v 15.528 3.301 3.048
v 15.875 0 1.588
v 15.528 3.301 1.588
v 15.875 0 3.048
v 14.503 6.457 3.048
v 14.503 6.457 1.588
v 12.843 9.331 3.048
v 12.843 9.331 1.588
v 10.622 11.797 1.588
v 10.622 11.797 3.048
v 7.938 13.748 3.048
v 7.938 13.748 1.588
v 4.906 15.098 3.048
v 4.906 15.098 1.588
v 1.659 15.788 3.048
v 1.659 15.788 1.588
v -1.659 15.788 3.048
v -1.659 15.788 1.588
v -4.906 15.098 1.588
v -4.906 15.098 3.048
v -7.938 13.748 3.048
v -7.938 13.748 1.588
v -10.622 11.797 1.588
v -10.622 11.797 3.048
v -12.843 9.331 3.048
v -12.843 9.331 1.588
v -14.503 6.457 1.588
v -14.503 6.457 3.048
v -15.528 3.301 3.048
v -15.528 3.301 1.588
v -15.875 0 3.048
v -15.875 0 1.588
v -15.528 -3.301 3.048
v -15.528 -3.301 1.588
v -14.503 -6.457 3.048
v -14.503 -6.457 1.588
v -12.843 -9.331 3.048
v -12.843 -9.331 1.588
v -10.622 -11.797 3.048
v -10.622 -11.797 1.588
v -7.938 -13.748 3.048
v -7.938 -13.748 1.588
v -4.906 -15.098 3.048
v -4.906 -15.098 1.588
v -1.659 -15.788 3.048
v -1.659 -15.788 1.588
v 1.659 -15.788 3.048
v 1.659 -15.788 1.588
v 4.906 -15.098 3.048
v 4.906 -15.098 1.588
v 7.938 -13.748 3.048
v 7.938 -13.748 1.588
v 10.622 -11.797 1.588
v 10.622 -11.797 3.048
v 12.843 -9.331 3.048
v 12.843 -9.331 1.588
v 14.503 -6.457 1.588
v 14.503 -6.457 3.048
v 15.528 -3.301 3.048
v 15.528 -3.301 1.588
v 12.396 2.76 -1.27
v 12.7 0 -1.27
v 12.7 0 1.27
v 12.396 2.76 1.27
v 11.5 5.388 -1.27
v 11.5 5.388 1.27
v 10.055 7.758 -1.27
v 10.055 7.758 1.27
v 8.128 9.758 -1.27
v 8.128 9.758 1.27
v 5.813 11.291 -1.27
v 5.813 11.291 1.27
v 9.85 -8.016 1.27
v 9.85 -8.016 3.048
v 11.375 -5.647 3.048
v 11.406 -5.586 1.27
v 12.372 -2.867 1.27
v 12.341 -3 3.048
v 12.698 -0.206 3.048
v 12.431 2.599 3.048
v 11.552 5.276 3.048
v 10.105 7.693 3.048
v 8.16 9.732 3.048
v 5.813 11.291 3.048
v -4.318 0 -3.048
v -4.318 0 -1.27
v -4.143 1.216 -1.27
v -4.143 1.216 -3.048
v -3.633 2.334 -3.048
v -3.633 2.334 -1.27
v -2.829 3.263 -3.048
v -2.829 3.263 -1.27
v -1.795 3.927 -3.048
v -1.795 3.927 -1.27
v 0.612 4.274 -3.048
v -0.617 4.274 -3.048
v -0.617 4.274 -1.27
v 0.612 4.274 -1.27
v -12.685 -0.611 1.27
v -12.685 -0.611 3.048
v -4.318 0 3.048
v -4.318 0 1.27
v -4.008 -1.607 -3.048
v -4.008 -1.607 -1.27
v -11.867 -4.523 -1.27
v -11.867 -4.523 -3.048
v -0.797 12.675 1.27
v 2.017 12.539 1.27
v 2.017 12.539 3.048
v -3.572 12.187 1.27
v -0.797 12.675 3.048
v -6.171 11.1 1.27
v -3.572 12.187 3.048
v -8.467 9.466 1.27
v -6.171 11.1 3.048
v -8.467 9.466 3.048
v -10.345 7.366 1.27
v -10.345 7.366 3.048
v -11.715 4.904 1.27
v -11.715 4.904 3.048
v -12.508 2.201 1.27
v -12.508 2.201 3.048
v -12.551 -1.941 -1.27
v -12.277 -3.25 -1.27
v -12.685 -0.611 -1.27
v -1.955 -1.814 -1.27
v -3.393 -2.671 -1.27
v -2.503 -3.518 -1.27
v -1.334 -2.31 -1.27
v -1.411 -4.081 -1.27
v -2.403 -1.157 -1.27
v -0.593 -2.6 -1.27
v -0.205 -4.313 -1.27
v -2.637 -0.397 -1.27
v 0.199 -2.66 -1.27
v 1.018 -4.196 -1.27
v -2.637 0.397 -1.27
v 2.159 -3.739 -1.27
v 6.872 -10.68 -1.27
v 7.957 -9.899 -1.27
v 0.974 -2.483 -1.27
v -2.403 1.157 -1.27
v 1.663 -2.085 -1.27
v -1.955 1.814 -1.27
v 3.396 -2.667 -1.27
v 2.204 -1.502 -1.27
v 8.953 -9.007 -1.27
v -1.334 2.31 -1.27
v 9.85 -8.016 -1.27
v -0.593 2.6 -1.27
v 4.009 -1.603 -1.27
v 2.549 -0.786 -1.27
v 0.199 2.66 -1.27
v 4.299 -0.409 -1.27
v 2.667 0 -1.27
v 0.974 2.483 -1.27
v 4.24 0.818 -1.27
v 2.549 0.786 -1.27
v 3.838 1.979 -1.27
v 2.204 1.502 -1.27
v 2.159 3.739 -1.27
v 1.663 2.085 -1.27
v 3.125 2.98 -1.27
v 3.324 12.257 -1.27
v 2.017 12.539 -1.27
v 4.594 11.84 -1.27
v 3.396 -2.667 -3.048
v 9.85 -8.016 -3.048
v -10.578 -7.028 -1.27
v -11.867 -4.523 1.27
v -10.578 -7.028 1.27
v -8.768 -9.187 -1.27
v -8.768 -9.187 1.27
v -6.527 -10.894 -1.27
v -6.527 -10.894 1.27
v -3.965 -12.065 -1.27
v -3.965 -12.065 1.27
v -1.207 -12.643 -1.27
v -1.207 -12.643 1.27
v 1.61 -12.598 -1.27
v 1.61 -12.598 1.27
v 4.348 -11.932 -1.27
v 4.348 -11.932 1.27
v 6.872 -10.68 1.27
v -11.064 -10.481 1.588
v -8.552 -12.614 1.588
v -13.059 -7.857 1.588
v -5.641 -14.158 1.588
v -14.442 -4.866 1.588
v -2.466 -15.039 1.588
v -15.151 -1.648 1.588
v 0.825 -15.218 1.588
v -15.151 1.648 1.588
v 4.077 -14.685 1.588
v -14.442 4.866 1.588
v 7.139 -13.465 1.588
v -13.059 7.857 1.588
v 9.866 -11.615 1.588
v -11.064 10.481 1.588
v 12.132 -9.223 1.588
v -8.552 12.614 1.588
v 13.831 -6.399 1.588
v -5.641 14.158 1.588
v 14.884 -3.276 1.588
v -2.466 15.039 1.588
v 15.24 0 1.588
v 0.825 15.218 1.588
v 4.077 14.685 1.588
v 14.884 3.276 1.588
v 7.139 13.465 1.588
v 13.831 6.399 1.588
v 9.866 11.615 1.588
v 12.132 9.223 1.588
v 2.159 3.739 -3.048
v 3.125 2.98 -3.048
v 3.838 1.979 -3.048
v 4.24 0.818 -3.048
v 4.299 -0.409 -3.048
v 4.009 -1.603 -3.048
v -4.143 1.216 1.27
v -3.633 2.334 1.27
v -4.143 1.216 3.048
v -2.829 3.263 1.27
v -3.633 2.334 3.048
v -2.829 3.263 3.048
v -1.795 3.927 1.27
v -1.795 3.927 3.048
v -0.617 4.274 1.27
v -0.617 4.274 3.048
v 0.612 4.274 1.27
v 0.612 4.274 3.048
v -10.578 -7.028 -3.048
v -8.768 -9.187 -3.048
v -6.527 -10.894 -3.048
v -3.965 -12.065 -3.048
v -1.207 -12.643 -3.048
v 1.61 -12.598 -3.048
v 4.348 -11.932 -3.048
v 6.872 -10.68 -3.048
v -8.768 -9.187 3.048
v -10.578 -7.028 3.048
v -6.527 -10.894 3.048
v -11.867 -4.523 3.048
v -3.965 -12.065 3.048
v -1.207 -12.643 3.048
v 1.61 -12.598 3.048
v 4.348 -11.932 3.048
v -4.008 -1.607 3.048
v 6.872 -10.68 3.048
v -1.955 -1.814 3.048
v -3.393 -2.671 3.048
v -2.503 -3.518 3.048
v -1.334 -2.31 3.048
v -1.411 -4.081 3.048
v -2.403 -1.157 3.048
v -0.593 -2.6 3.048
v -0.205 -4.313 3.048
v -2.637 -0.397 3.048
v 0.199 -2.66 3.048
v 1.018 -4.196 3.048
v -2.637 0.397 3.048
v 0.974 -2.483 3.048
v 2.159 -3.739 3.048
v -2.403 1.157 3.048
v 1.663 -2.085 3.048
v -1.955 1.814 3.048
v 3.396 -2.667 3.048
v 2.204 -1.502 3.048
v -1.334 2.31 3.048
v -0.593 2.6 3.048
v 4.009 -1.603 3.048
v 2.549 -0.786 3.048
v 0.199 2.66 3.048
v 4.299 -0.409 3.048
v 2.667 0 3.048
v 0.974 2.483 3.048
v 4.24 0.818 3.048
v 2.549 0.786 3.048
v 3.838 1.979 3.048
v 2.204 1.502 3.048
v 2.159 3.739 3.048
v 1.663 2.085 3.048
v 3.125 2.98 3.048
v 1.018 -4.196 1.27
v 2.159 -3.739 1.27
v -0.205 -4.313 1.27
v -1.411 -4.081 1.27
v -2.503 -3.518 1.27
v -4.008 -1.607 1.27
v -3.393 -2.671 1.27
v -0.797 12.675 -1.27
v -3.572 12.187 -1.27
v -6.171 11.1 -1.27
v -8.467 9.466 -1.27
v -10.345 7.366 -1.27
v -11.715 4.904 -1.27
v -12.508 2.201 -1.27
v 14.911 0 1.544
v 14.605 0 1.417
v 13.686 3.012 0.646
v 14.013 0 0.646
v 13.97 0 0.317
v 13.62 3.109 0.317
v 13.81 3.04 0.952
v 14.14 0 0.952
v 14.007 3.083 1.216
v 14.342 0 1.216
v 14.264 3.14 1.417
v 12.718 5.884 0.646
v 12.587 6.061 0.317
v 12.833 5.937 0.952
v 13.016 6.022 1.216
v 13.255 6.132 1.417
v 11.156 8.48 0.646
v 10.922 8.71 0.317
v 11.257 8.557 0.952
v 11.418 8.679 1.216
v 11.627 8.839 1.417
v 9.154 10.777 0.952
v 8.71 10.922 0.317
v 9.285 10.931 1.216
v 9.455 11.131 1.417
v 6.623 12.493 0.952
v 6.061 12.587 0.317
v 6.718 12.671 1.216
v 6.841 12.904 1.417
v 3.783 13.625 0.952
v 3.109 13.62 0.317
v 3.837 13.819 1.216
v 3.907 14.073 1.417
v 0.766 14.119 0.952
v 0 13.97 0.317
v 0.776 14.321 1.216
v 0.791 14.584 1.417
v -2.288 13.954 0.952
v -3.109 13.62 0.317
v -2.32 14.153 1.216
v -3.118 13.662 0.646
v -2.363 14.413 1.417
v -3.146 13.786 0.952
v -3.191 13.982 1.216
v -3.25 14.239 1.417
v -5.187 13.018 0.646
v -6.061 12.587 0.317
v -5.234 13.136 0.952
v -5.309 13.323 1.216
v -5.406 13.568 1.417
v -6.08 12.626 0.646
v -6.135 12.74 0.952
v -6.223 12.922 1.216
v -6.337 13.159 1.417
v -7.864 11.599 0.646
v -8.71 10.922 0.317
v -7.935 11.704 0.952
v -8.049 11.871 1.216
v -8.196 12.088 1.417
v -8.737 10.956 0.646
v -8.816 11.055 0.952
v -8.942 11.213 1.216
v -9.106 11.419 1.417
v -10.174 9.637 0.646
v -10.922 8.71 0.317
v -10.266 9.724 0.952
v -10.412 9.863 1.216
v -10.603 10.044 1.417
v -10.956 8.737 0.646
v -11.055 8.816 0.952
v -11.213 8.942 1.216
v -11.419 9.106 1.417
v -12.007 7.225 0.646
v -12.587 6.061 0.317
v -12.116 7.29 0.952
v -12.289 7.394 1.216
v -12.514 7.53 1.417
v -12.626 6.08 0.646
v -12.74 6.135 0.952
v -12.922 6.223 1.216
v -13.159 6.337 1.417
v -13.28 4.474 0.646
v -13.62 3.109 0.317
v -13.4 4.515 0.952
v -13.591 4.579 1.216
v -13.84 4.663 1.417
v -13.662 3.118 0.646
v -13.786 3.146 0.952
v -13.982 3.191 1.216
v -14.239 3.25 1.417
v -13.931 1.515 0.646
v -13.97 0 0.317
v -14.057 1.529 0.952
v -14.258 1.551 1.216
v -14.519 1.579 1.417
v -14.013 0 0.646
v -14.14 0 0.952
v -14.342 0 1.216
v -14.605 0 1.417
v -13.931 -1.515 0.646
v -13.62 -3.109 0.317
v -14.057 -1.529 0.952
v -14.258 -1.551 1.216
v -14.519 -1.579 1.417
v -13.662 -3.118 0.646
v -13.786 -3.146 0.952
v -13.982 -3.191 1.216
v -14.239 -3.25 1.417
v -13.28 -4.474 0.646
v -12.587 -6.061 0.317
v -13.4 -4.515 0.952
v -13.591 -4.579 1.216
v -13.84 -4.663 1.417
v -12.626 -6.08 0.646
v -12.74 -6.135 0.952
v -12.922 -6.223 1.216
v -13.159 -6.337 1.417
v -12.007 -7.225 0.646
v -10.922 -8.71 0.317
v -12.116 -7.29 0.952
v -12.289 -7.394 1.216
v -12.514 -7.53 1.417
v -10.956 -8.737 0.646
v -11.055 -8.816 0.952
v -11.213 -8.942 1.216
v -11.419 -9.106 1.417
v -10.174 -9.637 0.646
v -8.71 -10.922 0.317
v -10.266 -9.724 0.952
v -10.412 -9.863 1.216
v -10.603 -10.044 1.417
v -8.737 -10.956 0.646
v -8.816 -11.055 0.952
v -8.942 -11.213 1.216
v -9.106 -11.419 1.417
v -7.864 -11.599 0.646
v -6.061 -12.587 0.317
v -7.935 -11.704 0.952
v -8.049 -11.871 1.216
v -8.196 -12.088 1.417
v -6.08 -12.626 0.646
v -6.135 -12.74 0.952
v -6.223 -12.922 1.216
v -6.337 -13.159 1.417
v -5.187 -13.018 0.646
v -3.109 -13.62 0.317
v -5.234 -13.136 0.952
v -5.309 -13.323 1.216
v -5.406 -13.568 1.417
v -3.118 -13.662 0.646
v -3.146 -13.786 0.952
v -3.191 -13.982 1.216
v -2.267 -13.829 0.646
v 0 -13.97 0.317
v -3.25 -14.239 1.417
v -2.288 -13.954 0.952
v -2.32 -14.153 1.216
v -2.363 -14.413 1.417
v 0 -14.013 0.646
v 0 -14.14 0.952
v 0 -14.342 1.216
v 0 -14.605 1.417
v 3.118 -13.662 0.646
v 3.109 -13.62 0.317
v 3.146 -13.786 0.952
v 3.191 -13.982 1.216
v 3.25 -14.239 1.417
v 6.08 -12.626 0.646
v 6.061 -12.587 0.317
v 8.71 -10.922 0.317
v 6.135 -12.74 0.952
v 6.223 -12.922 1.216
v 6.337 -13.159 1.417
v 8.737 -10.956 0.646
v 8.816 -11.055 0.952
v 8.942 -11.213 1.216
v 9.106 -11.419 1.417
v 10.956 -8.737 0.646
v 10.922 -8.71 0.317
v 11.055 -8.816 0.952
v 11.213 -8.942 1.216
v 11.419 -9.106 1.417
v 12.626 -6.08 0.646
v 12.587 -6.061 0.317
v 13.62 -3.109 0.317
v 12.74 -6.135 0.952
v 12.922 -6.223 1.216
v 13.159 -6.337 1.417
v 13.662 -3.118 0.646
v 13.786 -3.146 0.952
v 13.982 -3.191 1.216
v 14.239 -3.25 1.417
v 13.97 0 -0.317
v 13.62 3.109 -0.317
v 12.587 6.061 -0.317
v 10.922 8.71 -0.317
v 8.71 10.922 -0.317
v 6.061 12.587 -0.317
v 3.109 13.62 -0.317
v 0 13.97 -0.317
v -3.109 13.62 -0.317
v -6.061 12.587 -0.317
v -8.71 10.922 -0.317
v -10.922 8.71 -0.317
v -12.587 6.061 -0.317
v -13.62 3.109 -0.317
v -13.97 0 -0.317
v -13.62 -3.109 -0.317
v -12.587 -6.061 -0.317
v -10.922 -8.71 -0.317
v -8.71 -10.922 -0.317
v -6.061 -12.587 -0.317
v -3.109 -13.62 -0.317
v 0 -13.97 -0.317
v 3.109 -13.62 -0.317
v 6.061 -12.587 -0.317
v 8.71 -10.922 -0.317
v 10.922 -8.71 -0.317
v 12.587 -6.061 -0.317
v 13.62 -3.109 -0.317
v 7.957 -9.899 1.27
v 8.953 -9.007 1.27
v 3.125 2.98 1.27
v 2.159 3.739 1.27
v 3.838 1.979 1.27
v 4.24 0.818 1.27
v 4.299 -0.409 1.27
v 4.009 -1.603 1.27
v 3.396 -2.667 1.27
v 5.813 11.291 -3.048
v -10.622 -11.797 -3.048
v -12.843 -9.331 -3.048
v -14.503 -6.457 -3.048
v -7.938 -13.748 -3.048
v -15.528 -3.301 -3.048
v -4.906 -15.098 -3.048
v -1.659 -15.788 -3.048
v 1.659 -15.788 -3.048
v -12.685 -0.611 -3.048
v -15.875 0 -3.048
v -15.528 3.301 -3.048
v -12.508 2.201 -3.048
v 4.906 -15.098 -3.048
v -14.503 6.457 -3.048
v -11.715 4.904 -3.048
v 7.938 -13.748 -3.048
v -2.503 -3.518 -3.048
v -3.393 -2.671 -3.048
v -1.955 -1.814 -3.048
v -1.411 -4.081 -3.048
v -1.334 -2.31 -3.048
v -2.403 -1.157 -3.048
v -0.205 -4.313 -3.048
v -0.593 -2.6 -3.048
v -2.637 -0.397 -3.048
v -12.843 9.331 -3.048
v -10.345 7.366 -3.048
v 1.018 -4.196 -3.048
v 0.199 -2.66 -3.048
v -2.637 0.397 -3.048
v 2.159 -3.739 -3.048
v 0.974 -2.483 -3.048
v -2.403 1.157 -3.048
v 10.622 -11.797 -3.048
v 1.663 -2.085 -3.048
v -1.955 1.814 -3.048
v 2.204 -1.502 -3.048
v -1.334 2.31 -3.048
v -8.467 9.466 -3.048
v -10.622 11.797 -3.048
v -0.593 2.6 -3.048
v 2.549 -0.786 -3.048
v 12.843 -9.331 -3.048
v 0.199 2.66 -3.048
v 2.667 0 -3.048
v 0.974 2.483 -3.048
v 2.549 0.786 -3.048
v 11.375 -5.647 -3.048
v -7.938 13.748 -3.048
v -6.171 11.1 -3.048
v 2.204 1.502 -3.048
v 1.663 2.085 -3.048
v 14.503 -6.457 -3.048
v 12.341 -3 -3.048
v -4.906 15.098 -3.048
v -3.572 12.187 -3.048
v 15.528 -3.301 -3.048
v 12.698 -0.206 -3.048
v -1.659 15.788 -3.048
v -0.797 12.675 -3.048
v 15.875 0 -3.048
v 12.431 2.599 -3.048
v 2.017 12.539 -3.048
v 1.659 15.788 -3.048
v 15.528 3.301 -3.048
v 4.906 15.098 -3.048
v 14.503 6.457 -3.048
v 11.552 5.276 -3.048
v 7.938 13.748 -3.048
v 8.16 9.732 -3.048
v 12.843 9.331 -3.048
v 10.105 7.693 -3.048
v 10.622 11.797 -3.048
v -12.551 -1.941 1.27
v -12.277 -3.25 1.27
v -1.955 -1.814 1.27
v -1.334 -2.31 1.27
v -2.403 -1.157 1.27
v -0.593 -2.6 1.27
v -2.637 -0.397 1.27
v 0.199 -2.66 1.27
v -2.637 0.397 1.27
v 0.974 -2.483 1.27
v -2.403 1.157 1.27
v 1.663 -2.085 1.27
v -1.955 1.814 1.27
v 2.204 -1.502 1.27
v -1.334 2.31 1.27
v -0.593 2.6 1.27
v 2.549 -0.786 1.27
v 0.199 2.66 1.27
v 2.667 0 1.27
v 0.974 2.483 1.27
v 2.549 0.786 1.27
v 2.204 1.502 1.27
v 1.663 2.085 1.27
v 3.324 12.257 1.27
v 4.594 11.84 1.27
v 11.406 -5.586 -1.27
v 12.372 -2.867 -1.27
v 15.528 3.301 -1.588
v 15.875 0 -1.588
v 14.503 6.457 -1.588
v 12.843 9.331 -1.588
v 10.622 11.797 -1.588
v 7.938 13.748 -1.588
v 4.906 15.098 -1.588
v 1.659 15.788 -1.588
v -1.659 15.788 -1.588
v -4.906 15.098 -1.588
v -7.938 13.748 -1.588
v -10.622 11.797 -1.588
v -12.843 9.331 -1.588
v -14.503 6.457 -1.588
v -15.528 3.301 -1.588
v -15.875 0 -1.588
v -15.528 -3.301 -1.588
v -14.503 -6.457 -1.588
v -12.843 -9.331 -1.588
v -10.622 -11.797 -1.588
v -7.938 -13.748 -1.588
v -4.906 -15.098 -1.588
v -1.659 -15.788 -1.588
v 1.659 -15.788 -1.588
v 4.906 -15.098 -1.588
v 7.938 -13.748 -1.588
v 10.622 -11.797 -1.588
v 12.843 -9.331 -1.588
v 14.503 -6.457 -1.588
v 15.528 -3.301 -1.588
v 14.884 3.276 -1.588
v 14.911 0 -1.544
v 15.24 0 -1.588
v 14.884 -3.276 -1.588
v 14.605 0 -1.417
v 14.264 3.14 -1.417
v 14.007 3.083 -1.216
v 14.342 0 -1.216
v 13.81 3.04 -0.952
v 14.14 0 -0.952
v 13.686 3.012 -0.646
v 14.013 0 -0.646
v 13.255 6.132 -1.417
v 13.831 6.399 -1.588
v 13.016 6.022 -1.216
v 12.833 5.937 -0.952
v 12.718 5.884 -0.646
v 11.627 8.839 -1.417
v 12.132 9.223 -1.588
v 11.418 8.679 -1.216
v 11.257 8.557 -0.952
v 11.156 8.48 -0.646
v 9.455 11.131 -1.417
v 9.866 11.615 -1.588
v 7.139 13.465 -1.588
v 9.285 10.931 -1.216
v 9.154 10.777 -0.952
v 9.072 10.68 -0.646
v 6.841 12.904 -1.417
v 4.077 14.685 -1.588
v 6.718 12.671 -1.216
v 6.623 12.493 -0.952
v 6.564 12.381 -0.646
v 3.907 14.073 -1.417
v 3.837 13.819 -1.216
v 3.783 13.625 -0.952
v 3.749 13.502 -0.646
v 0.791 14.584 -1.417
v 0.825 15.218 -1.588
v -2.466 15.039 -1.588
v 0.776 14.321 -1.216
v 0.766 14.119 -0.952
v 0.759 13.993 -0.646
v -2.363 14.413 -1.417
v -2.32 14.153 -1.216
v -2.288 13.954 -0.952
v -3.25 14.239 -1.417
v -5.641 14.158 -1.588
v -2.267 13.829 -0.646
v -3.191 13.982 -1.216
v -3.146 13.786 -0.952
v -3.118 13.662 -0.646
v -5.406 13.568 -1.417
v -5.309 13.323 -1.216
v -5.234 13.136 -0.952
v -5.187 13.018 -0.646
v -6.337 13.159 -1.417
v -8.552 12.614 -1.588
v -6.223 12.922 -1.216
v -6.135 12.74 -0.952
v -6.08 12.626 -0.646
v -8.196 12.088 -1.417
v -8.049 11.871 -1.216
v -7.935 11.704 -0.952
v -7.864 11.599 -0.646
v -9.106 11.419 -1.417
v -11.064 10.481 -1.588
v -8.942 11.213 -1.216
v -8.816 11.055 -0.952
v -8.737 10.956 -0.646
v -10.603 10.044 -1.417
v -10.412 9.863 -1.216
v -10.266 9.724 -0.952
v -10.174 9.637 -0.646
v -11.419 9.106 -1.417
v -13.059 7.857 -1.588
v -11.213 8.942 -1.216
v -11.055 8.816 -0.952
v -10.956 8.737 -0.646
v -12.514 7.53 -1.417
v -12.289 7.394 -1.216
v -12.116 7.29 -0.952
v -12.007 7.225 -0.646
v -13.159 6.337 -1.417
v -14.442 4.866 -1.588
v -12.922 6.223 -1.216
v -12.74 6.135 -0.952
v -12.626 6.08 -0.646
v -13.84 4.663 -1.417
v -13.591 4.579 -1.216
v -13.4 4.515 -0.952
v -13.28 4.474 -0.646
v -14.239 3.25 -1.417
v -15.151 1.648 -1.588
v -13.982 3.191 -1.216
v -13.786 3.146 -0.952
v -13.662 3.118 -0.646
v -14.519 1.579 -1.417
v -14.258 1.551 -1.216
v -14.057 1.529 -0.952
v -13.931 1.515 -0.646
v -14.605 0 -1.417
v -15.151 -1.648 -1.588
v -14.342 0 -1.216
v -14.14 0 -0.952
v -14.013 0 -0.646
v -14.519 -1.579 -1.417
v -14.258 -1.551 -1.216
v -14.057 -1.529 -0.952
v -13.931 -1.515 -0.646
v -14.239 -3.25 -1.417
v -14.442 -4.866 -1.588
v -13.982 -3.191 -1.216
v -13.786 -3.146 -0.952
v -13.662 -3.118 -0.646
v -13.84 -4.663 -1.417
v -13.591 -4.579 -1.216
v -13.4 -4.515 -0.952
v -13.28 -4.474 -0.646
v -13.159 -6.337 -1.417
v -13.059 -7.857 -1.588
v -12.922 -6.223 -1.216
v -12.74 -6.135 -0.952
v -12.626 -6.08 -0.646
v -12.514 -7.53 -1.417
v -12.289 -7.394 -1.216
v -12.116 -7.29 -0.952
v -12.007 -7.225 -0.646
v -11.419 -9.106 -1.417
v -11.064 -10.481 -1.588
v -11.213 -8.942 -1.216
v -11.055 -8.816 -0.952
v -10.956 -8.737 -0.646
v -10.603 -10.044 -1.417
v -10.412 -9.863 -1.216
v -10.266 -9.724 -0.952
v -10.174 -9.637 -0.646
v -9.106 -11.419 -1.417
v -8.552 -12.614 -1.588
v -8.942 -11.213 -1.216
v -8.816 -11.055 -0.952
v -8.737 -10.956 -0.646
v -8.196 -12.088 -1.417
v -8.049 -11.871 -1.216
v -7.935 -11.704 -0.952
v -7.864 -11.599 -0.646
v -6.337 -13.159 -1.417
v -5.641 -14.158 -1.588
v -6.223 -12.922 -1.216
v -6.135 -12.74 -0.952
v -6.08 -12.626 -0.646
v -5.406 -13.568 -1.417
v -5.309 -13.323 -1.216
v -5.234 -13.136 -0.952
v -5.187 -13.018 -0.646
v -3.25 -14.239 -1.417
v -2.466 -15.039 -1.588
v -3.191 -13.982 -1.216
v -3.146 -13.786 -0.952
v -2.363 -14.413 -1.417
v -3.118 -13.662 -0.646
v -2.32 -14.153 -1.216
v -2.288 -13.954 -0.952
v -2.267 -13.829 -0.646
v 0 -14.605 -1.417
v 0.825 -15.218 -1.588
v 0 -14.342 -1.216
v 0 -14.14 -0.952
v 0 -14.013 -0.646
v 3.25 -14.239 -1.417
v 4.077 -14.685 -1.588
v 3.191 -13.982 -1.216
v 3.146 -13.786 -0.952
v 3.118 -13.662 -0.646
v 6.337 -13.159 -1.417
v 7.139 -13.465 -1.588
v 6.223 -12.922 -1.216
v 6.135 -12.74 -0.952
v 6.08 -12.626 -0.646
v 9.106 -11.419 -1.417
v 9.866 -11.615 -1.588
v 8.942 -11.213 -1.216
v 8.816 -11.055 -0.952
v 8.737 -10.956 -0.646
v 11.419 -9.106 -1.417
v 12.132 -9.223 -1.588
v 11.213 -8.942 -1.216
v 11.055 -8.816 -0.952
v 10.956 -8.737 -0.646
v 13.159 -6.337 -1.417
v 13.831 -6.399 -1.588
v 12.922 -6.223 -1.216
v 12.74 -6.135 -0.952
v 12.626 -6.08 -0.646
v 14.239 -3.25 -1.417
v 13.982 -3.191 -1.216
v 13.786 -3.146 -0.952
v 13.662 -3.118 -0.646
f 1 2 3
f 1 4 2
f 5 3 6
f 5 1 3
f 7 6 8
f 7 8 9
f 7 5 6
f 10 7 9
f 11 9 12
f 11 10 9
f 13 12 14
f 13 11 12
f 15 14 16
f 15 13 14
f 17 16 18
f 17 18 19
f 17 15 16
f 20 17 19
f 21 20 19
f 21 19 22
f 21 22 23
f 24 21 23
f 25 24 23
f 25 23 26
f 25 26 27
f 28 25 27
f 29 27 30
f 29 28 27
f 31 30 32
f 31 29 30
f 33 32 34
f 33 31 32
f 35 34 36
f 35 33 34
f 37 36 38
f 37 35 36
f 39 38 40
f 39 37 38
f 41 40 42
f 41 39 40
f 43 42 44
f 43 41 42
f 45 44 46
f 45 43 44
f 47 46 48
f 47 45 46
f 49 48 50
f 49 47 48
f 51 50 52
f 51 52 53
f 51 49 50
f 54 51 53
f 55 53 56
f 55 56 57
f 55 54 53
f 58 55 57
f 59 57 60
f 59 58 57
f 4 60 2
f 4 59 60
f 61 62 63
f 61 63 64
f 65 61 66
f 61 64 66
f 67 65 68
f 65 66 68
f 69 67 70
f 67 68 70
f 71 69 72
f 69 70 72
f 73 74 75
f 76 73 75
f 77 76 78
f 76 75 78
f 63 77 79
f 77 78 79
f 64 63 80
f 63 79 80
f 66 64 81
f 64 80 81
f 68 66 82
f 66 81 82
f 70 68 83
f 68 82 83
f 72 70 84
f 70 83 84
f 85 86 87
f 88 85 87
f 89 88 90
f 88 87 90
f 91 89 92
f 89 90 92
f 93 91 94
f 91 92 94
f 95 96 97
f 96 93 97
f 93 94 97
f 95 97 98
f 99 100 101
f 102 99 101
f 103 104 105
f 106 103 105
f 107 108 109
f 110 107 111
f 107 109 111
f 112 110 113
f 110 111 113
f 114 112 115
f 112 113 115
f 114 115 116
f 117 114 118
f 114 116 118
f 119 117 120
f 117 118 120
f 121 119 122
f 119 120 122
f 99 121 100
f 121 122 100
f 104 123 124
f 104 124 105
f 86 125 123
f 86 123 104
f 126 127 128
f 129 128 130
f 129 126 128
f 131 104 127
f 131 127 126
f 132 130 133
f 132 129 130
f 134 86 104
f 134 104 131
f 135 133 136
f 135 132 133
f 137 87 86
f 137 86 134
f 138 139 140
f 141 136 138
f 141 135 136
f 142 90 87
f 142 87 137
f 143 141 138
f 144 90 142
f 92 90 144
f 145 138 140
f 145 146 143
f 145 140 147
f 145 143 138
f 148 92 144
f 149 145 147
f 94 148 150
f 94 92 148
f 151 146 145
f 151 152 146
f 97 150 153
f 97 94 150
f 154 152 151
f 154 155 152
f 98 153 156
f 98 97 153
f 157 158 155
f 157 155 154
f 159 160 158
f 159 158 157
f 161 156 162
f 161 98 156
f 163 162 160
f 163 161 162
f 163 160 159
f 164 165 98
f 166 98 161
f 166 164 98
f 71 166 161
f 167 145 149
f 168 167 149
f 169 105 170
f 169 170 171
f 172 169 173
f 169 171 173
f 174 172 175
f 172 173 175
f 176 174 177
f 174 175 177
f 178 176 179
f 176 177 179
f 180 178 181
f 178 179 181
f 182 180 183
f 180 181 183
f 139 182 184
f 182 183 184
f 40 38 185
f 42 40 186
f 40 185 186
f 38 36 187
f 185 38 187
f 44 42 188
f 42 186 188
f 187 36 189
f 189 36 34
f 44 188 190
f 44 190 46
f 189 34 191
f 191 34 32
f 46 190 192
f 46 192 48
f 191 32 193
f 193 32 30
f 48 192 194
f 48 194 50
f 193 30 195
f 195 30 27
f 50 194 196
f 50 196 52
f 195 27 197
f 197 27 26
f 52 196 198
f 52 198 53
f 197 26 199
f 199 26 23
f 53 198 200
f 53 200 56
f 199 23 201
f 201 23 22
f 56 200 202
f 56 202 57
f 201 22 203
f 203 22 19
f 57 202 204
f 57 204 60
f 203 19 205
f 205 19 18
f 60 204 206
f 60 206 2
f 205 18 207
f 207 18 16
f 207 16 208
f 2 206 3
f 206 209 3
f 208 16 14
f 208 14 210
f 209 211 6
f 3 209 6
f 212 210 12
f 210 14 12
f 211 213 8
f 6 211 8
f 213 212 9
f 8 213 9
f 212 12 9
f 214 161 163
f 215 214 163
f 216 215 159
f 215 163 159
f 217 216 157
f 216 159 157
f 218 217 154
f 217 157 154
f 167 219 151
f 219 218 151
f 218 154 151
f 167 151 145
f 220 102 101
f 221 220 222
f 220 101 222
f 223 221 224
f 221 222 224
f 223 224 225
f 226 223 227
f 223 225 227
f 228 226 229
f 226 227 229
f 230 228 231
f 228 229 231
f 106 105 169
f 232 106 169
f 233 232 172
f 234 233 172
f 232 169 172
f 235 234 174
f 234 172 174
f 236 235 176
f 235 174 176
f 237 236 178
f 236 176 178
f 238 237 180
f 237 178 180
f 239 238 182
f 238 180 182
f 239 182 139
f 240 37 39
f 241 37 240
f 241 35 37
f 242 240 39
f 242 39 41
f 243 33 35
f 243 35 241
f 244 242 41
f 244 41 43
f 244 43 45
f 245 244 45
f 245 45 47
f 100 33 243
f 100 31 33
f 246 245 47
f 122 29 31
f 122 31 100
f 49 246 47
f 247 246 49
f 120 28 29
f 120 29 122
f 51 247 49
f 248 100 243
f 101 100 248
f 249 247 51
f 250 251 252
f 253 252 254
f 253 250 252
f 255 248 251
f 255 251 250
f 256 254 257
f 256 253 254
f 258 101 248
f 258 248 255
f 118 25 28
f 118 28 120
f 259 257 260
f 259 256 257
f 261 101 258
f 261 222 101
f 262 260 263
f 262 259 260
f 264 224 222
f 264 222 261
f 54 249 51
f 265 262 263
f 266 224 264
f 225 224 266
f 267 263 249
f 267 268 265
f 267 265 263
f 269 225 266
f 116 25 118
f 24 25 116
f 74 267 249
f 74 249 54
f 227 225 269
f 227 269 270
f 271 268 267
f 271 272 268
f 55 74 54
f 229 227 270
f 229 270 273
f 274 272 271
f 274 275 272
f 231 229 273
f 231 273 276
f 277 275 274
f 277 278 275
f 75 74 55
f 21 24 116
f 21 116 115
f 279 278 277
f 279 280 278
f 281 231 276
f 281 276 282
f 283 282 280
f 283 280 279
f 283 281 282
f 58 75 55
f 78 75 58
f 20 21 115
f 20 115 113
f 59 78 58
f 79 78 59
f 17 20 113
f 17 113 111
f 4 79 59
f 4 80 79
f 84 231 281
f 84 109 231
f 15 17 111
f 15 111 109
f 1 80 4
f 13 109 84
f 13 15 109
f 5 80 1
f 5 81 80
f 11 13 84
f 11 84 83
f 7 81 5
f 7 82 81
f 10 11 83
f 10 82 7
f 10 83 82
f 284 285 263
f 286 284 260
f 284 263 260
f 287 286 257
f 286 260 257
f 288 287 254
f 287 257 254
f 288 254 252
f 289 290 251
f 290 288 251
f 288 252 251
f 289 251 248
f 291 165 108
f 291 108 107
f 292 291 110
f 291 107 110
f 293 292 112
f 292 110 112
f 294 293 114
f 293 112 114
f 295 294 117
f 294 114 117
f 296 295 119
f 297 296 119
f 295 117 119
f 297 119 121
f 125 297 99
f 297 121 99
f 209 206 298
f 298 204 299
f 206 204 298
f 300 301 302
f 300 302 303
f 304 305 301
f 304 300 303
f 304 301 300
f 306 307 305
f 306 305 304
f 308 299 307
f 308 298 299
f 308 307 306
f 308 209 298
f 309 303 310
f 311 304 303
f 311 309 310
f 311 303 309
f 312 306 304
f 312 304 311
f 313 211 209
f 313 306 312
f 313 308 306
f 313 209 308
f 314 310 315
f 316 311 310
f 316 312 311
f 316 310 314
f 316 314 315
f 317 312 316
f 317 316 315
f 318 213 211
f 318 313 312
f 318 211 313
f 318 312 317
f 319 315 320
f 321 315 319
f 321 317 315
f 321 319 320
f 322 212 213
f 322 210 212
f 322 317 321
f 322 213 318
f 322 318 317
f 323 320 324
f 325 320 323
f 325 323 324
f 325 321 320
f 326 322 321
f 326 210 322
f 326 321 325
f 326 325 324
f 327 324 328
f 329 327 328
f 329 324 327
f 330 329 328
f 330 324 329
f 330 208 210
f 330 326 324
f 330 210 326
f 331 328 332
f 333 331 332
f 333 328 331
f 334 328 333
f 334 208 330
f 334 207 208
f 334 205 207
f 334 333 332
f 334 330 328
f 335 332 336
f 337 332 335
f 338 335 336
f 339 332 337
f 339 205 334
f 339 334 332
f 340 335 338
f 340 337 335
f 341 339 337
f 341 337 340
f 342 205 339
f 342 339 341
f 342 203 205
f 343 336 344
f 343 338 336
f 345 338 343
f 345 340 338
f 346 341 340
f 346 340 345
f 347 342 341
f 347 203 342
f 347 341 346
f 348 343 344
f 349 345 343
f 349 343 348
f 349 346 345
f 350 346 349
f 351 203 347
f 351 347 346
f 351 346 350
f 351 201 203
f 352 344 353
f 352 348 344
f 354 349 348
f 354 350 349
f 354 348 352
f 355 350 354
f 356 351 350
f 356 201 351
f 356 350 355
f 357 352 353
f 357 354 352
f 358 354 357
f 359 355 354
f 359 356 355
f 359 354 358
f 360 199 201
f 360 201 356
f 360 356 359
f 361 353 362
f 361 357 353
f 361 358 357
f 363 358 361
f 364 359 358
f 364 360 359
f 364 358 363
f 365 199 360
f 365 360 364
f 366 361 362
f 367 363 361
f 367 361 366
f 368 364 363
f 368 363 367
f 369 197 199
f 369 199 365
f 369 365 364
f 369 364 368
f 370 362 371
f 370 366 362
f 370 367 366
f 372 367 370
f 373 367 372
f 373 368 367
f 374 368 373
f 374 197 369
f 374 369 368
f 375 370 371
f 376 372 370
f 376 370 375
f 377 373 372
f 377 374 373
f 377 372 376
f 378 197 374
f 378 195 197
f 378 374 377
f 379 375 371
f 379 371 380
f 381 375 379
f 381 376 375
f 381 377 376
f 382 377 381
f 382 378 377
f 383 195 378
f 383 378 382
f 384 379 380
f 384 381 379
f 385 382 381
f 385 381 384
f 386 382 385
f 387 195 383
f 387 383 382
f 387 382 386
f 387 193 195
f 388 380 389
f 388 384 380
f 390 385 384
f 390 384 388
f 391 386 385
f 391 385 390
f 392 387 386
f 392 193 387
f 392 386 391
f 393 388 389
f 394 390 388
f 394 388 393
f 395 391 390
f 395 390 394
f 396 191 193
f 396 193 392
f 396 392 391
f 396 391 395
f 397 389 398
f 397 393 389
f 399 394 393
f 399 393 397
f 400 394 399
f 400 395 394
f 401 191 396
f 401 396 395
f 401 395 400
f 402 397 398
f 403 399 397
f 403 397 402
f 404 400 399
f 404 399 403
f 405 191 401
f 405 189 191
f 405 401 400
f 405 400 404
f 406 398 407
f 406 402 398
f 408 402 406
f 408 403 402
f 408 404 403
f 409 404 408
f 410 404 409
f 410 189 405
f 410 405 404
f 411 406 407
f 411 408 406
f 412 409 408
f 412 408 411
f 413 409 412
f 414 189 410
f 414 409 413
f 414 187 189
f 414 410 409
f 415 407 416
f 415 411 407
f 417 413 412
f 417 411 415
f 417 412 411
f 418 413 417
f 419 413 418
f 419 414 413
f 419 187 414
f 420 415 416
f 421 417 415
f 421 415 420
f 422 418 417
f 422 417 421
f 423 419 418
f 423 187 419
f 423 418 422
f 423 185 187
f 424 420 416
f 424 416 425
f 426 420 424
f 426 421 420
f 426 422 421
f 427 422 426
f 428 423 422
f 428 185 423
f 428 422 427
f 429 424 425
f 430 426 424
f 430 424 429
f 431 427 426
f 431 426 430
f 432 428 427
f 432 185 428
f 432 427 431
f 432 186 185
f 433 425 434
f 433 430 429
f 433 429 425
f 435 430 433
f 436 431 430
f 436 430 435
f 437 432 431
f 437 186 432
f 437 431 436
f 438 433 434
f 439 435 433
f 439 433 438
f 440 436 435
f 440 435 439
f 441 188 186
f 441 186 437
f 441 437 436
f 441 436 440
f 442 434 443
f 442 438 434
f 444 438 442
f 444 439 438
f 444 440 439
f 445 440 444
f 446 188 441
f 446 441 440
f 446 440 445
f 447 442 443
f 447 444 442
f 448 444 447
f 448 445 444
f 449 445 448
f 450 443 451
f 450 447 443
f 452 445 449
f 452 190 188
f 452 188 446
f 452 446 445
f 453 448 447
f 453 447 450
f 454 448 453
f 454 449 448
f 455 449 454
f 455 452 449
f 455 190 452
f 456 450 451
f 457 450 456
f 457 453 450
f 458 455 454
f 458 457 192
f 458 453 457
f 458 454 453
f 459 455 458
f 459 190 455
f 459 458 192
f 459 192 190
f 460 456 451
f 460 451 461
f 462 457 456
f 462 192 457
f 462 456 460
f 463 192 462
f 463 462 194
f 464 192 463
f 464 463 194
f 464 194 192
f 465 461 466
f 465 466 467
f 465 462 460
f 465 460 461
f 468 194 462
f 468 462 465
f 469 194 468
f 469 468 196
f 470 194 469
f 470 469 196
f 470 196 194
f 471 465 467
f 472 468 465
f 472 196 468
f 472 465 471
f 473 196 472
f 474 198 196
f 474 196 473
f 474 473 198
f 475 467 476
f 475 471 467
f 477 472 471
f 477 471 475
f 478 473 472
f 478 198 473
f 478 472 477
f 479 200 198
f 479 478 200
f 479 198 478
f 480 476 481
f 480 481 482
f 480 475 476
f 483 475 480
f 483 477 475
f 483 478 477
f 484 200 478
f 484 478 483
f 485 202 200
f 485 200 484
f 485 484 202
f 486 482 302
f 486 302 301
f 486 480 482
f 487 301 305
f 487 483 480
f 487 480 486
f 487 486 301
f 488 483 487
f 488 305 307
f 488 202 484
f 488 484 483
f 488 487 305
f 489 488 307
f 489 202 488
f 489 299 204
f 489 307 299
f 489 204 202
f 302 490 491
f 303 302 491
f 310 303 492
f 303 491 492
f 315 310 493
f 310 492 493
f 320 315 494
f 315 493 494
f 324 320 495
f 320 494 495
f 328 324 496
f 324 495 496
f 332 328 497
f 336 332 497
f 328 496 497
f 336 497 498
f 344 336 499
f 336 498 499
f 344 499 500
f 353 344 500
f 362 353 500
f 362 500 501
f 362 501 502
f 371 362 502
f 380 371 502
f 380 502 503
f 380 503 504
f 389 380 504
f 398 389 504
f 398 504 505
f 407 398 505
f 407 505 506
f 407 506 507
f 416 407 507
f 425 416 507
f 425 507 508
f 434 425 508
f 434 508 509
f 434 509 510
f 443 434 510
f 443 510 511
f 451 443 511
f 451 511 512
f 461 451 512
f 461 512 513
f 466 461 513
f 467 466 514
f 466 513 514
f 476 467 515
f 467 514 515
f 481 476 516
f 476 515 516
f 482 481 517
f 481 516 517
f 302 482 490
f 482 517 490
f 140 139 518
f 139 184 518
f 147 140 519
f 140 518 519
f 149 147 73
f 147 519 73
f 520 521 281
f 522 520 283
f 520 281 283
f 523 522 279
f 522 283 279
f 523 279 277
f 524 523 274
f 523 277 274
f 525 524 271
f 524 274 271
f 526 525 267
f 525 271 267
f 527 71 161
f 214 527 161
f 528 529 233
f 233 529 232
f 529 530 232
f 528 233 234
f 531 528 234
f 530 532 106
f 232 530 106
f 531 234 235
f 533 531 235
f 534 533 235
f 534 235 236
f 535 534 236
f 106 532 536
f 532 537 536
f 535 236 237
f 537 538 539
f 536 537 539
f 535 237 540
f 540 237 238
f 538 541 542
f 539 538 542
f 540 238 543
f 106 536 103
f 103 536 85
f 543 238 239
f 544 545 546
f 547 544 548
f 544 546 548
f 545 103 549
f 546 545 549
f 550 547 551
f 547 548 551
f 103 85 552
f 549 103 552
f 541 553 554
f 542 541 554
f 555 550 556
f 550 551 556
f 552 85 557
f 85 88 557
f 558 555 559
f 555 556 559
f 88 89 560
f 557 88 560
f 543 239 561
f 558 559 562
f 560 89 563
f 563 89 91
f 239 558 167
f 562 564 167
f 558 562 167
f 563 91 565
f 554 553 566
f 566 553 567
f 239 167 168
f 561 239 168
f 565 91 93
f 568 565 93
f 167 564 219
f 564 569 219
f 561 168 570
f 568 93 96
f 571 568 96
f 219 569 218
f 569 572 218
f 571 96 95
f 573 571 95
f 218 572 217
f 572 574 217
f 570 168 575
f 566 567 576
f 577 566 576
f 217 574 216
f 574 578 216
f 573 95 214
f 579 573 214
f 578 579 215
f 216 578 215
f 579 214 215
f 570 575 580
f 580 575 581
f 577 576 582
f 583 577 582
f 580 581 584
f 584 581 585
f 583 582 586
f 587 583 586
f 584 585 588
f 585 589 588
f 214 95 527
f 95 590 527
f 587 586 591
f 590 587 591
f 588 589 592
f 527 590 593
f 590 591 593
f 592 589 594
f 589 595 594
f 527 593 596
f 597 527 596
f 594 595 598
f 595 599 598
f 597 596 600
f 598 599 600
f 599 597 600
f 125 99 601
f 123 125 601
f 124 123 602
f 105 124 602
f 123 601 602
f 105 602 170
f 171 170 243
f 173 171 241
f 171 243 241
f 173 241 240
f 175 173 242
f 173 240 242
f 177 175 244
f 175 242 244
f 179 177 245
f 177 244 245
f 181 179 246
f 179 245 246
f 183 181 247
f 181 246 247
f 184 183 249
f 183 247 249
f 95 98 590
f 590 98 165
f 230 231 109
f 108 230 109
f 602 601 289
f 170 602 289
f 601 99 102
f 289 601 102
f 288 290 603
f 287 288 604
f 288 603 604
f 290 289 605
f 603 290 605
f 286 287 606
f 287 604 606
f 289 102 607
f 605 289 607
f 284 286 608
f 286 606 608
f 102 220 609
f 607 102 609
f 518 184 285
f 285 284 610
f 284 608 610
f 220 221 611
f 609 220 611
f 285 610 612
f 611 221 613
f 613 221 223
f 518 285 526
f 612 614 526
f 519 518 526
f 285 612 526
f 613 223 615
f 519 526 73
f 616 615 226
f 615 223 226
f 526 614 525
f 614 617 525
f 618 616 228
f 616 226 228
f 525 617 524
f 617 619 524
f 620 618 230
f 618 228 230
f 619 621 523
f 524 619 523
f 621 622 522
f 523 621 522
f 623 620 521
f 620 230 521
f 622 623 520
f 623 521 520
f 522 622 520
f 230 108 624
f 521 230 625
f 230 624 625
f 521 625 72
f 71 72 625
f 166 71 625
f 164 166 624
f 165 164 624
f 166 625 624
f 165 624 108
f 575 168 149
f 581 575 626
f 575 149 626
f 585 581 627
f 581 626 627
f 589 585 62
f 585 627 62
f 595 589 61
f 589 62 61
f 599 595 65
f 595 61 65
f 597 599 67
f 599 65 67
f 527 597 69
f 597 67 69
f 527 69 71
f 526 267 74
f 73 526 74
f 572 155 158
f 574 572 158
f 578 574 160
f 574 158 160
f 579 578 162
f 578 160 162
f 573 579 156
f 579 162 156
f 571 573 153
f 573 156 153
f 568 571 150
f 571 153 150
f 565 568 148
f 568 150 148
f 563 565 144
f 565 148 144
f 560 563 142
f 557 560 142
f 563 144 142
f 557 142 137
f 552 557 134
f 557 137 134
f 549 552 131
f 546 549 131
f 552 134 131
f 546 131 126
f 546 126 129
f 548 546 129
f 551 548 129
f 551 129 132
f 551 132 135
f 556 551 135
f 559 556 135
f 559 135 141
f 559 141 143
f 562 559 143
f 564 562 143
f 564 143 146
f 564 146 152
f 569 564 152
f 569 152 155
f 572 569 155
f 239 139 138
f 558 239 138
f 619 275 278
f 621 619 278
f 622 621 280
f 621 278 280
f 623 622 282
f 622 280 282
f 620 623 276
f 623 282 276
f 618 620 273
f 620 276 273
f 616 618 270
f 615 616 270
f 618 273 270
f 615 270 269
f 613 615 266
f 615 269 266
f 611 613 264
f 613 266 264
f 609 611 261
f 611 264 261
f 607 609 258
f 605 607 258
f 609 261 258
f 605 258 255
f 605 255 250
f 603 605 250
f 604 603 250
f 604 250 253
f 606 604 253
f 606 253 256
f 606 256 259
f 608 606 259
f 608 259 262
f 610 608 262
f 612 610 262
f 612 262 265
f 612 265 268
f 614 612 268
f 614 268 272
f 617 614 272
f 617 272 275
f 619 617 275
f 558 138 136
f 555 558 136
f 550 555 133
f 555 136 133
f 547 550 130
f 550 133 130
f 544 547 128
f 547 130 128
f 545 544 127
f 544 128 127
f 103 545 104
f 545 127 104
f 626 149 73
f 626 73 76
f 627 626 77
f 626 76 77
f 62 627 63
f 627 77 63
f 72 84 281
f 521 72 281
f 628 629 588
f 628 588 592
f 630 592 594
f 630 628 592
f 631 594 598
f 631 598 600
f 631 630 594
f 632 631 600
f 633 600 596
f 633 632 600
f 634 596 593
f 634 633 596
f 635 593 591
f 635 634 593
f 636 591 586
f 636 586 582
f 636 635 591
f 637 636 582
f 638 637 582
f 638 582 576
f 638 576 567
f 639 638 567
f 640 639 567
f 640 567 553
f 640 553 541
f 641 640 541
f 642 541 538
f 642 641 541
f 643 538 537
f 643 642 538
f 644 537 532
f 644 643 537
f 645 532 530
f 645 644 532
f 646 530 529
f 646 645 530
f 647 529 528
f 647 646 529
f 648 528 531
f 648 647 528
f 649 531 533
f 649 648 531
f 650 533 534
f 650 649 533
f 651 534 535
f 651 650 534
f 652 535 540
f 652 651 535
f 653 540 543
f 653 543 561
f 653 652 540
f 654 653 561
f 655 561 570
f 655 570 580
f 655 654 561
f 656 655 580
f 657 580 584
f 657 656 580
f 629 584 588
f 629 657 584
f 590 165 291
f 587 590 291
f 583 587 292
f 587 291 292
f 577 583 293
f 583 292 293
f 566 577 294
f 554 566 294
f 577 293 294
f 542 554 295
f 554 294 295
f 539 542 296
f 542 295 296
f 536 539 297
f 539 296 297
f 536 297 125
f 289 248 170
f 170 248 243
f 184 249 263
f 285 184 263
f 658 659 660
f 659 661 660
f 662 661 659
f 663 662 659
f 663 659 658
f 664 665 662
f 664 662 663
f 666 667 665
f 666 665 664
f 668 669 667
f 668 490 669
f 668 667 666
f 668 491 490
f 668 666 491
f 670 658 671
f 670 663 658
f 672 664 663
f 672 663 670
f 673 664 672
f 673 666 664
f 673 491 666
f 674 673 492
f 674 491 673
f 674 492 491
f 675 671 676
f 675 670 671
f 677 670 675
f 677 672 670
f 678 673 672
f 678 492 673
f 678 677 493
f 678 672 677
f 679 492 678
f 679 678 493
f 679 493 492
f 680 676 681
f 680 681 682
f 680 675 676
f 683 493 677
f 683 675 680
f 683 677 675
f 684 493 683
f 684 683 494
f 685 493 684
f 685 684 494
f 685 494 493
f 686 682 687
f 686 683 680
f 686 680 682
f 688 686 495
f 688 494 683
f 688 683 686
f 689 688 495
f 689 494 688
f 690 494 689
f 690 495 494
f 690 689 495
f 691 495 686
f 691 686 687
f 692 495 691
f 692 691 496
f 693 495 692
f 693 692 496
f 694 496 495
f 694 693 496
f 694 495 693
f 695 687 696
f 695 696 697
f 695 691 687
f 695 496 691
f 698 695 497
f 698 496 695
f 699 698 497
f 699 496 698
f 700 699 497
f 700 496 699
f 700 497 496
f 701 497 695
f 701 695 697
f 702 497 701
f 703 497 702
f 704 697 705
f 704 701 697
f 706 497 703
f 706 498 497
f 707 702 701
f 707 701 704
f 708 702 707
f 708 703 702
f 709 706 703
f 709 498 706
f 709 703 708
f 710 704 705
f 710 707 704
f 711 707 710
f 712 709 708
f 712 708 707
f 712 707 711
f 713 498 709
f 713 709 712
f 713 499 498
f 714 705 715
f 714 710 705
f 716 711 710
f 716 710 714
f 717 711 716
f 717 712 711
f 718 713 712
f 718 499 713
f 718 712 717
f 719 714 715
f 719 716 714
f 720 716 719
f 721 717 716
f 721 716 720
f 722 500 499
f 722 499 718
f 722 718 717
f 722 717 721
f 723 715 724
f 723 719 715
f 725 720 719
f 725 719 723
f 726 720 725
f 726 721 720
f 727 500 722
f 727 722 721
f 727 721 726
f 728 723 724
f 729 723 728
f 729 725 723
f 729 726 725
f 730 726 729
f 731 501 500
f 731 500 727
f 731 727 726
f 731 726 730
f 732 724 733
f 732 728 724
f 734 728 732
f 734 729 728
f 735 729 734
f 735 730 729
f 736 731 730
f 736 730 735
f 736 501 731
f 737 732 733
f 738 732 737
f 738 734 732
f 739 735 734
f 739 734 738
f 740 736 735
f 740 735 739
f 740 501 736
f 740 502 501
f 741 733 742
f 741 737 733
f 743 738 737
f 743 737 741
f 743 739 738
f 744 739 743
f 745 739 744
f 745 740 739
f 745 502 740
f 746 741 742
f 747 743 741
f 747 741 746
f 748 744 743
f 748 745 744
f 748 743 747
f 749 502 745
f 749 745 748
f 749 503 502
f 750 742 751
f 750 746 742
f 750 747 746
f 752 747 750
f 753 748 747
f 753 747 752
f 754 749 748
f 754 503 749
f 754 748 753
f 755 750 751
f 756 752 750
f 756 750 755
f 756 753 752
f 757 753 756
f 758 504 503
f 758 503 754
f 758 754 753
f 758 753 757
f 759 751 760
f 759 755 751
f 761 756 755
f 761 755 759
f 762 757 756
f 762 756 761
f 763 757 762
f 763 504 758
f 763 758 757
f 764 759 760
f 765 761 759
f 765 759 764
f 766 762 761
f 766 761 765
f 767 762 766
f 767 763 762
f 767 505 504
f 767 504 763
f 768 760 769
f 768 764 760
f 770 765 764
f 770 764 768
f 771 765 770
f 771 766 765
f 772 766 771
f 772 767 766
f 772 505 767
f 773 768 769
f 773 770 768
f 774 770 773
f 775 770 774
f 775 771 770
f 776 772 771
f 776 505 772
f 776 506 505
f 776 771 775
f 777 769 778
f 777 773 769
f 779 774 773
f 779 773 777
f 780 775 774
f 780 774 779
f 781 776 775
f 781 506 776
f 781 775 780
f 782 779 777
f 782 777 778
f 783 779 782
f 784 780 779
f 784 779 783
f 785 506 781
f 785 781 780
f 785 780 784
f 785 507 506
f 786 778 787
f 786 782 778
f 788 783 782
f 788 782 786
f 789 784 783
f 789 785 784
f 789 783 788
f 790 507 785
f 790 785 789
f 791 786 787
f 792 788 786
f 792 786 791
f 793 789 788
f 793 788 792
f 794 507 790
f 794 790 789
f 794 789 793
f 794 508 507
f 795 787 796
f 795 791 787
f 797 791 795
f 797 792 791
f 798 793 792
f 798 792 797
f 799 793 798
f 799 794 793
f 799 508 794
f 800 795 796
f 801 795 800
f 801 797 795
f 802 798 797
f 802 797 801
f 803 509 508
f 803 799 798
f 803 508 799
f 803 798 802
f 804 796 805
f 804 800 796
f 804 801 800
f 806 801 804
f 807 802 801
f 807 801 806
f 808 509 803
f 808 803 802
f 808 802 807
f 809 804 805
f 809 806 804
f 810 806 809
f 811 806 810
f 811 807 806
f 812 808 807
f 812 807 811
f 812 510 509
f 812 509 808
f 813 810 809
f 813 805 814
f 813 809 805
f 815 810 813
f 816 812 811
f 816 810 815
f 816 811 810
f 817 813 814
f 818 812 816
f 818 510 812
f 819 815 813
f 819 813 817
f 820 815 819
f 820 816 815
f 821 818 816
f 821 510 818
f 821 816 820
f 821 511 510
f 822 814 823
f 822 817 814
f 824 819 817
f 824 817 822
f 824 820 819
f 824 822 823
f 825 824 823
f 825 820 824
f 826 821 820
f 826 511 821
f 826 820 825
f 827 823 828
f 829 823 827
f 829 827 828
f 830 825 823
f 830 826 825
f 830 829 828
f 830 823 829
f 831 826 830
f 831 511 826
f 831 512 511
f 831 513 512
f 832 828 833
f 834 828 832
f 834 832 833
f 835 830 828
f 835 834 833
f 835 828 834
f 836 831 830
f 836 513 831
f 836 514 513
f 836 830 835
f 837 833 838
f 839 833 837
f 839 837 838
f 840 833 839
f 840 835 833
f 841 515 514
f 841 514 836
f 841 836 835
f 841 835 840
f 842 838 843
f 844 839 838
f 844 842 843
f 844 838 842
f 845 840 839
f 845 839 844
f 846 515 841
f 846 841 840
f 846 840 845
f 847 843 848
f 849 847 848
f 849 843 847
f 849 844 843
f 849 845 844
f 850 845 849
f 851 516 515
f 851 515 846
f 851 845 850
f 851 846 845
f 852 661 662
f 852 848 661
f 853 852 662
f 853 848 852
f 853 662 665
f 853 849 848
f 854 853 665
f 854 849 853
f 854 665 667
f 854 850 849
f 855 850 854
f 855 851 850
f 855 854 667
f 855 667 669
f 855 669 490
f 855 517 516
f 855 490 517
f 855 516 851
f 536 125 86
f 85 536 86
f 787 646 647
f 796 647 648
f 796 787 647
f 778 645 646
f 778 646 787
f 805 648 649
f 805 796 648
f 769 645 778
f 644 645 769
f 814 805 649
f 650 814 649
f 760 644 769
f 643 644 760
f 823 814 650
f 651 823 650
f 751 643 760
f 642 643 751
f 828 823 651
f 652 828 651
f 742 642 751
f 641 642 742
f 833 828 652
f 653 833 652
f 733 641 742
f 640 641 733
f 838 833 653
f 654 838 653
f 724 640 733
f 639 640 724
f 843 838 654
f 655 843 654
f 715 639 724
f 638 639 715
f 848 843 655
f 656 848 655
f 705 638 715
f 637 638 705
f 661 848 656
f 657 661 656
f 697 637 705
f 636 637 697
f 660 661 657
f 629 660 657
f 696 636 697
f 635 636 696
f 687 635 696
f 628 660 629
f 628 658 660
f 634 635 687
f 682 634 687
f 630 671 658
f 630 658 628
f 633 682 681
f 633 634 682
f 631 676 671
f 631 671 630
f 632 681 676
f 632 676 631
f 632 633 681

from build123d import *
from build123d import SkipClean  # not in build123d's __all__

# Parameters (mm, degrees)
F0_R     = 15.875
F1_DEPTH = 3.048
F2_R     = 17.9958283003
F2_R_2   = 13.97
F3_DEPTH = 1.5875
F4_R     = 2.667
F5_DEPTH = 6.097
F6_R     = 1.27
F7_R     = 12.7
F8_DEPTH = 1.27


with BuildPart() as f1:
    # F0 (on Top) → F1 (new body, symmetric)
    with BuildSketch(Plane.XY):
        Circle(F0_R)
    extrude(amount=F1_DEPTH, both=True)

    # F2 (on Top) → F3 (cut, symmetric)
    with BuildSketch(Plane.XY):
        Circle(F2_R)
        Circle(F2_R_2, mode=Mode.SUBTRACT)
    extrude(amount=F3_DEPTH, both=True, mode=Mode.SUBTRACT)

    # F4 (on face) → F5 (cut, through all)
    with BuildSketch(Plane.XY.offset(3.048)):
        with BuildLine():
            Line((0.6120390991, 4.2744043025), (2.0170417977, 12.5388014733))
            ThreePointArc((2.0170417977, 12.5388014733), (-8.4665969818, 9.4660834323), (-12.6852858441, -0.6111653244))
            Line((-12.6852858441, -0.6111653244), (-4.318, 0))
            ThreePointArc((-4.318, 0), (-2.8286338726, 3.2625073816), (0.6120390991, 4.2744043025))
        make_face()
        Circle(F4_R)
        with BuildLine():
            ThreePointArc((2.159, -3.7394976935), (-1.4110973362, -4.0809224824), (-4.0077622616, -1.6071607433))
            Line((-4.0077622616, -1.6071607433), (-11.8674415077, -4.5225912993))
            ThreePointArc((-11.8674415077, -4.5225912993), (-3.9645702358, -12.065329786), (6.8719276189, -10.6801971331))
            Line((6.8719276189, -10.6801971331), (2.159, -3.7394976935))
        make_face()
        with BuildLine():
            ThreePointArc((2.159, 3.7394976935), (4.2397312088, 0.8184151008), (3.3957231624, -2.6672435592))
            Line((3.3957231624, -2.6672435592), (9.85039971, -8.016210174))
            ThreePointArc((9.85039971, -8.016210174), (12.4311672176, 2.5992463537), (5.8133582252, 11.2913624574))
            Line((5.8133582252, 11.2913624574), (2.159, 3.7394976935))
        make_face()
    extrude(amount=-F5_DEPTH, mode=Mode.SUBTRACT)

    # F6
    f6_edges = [f1.edges().sort_by_distance(p)[0] for p in [
        (-13.97, 0, -1.5875),
        (-13.97, 0, 1.5875),
    ]]
    fillet(f6_edges, radius=F6_R)

    # F7 (on Top) → F8 (cut, symmetric)
    with BuildSketch(Plane.XY):
        Circle(F7_R)
    with SkipClean():  # cleaning this boolean's faces spoils the solid; the shape is the same uncleaned
        extrude(amount=F8_DEPTH, both=True, mode=Mode.SUBTRACT)


solid = f1.part
